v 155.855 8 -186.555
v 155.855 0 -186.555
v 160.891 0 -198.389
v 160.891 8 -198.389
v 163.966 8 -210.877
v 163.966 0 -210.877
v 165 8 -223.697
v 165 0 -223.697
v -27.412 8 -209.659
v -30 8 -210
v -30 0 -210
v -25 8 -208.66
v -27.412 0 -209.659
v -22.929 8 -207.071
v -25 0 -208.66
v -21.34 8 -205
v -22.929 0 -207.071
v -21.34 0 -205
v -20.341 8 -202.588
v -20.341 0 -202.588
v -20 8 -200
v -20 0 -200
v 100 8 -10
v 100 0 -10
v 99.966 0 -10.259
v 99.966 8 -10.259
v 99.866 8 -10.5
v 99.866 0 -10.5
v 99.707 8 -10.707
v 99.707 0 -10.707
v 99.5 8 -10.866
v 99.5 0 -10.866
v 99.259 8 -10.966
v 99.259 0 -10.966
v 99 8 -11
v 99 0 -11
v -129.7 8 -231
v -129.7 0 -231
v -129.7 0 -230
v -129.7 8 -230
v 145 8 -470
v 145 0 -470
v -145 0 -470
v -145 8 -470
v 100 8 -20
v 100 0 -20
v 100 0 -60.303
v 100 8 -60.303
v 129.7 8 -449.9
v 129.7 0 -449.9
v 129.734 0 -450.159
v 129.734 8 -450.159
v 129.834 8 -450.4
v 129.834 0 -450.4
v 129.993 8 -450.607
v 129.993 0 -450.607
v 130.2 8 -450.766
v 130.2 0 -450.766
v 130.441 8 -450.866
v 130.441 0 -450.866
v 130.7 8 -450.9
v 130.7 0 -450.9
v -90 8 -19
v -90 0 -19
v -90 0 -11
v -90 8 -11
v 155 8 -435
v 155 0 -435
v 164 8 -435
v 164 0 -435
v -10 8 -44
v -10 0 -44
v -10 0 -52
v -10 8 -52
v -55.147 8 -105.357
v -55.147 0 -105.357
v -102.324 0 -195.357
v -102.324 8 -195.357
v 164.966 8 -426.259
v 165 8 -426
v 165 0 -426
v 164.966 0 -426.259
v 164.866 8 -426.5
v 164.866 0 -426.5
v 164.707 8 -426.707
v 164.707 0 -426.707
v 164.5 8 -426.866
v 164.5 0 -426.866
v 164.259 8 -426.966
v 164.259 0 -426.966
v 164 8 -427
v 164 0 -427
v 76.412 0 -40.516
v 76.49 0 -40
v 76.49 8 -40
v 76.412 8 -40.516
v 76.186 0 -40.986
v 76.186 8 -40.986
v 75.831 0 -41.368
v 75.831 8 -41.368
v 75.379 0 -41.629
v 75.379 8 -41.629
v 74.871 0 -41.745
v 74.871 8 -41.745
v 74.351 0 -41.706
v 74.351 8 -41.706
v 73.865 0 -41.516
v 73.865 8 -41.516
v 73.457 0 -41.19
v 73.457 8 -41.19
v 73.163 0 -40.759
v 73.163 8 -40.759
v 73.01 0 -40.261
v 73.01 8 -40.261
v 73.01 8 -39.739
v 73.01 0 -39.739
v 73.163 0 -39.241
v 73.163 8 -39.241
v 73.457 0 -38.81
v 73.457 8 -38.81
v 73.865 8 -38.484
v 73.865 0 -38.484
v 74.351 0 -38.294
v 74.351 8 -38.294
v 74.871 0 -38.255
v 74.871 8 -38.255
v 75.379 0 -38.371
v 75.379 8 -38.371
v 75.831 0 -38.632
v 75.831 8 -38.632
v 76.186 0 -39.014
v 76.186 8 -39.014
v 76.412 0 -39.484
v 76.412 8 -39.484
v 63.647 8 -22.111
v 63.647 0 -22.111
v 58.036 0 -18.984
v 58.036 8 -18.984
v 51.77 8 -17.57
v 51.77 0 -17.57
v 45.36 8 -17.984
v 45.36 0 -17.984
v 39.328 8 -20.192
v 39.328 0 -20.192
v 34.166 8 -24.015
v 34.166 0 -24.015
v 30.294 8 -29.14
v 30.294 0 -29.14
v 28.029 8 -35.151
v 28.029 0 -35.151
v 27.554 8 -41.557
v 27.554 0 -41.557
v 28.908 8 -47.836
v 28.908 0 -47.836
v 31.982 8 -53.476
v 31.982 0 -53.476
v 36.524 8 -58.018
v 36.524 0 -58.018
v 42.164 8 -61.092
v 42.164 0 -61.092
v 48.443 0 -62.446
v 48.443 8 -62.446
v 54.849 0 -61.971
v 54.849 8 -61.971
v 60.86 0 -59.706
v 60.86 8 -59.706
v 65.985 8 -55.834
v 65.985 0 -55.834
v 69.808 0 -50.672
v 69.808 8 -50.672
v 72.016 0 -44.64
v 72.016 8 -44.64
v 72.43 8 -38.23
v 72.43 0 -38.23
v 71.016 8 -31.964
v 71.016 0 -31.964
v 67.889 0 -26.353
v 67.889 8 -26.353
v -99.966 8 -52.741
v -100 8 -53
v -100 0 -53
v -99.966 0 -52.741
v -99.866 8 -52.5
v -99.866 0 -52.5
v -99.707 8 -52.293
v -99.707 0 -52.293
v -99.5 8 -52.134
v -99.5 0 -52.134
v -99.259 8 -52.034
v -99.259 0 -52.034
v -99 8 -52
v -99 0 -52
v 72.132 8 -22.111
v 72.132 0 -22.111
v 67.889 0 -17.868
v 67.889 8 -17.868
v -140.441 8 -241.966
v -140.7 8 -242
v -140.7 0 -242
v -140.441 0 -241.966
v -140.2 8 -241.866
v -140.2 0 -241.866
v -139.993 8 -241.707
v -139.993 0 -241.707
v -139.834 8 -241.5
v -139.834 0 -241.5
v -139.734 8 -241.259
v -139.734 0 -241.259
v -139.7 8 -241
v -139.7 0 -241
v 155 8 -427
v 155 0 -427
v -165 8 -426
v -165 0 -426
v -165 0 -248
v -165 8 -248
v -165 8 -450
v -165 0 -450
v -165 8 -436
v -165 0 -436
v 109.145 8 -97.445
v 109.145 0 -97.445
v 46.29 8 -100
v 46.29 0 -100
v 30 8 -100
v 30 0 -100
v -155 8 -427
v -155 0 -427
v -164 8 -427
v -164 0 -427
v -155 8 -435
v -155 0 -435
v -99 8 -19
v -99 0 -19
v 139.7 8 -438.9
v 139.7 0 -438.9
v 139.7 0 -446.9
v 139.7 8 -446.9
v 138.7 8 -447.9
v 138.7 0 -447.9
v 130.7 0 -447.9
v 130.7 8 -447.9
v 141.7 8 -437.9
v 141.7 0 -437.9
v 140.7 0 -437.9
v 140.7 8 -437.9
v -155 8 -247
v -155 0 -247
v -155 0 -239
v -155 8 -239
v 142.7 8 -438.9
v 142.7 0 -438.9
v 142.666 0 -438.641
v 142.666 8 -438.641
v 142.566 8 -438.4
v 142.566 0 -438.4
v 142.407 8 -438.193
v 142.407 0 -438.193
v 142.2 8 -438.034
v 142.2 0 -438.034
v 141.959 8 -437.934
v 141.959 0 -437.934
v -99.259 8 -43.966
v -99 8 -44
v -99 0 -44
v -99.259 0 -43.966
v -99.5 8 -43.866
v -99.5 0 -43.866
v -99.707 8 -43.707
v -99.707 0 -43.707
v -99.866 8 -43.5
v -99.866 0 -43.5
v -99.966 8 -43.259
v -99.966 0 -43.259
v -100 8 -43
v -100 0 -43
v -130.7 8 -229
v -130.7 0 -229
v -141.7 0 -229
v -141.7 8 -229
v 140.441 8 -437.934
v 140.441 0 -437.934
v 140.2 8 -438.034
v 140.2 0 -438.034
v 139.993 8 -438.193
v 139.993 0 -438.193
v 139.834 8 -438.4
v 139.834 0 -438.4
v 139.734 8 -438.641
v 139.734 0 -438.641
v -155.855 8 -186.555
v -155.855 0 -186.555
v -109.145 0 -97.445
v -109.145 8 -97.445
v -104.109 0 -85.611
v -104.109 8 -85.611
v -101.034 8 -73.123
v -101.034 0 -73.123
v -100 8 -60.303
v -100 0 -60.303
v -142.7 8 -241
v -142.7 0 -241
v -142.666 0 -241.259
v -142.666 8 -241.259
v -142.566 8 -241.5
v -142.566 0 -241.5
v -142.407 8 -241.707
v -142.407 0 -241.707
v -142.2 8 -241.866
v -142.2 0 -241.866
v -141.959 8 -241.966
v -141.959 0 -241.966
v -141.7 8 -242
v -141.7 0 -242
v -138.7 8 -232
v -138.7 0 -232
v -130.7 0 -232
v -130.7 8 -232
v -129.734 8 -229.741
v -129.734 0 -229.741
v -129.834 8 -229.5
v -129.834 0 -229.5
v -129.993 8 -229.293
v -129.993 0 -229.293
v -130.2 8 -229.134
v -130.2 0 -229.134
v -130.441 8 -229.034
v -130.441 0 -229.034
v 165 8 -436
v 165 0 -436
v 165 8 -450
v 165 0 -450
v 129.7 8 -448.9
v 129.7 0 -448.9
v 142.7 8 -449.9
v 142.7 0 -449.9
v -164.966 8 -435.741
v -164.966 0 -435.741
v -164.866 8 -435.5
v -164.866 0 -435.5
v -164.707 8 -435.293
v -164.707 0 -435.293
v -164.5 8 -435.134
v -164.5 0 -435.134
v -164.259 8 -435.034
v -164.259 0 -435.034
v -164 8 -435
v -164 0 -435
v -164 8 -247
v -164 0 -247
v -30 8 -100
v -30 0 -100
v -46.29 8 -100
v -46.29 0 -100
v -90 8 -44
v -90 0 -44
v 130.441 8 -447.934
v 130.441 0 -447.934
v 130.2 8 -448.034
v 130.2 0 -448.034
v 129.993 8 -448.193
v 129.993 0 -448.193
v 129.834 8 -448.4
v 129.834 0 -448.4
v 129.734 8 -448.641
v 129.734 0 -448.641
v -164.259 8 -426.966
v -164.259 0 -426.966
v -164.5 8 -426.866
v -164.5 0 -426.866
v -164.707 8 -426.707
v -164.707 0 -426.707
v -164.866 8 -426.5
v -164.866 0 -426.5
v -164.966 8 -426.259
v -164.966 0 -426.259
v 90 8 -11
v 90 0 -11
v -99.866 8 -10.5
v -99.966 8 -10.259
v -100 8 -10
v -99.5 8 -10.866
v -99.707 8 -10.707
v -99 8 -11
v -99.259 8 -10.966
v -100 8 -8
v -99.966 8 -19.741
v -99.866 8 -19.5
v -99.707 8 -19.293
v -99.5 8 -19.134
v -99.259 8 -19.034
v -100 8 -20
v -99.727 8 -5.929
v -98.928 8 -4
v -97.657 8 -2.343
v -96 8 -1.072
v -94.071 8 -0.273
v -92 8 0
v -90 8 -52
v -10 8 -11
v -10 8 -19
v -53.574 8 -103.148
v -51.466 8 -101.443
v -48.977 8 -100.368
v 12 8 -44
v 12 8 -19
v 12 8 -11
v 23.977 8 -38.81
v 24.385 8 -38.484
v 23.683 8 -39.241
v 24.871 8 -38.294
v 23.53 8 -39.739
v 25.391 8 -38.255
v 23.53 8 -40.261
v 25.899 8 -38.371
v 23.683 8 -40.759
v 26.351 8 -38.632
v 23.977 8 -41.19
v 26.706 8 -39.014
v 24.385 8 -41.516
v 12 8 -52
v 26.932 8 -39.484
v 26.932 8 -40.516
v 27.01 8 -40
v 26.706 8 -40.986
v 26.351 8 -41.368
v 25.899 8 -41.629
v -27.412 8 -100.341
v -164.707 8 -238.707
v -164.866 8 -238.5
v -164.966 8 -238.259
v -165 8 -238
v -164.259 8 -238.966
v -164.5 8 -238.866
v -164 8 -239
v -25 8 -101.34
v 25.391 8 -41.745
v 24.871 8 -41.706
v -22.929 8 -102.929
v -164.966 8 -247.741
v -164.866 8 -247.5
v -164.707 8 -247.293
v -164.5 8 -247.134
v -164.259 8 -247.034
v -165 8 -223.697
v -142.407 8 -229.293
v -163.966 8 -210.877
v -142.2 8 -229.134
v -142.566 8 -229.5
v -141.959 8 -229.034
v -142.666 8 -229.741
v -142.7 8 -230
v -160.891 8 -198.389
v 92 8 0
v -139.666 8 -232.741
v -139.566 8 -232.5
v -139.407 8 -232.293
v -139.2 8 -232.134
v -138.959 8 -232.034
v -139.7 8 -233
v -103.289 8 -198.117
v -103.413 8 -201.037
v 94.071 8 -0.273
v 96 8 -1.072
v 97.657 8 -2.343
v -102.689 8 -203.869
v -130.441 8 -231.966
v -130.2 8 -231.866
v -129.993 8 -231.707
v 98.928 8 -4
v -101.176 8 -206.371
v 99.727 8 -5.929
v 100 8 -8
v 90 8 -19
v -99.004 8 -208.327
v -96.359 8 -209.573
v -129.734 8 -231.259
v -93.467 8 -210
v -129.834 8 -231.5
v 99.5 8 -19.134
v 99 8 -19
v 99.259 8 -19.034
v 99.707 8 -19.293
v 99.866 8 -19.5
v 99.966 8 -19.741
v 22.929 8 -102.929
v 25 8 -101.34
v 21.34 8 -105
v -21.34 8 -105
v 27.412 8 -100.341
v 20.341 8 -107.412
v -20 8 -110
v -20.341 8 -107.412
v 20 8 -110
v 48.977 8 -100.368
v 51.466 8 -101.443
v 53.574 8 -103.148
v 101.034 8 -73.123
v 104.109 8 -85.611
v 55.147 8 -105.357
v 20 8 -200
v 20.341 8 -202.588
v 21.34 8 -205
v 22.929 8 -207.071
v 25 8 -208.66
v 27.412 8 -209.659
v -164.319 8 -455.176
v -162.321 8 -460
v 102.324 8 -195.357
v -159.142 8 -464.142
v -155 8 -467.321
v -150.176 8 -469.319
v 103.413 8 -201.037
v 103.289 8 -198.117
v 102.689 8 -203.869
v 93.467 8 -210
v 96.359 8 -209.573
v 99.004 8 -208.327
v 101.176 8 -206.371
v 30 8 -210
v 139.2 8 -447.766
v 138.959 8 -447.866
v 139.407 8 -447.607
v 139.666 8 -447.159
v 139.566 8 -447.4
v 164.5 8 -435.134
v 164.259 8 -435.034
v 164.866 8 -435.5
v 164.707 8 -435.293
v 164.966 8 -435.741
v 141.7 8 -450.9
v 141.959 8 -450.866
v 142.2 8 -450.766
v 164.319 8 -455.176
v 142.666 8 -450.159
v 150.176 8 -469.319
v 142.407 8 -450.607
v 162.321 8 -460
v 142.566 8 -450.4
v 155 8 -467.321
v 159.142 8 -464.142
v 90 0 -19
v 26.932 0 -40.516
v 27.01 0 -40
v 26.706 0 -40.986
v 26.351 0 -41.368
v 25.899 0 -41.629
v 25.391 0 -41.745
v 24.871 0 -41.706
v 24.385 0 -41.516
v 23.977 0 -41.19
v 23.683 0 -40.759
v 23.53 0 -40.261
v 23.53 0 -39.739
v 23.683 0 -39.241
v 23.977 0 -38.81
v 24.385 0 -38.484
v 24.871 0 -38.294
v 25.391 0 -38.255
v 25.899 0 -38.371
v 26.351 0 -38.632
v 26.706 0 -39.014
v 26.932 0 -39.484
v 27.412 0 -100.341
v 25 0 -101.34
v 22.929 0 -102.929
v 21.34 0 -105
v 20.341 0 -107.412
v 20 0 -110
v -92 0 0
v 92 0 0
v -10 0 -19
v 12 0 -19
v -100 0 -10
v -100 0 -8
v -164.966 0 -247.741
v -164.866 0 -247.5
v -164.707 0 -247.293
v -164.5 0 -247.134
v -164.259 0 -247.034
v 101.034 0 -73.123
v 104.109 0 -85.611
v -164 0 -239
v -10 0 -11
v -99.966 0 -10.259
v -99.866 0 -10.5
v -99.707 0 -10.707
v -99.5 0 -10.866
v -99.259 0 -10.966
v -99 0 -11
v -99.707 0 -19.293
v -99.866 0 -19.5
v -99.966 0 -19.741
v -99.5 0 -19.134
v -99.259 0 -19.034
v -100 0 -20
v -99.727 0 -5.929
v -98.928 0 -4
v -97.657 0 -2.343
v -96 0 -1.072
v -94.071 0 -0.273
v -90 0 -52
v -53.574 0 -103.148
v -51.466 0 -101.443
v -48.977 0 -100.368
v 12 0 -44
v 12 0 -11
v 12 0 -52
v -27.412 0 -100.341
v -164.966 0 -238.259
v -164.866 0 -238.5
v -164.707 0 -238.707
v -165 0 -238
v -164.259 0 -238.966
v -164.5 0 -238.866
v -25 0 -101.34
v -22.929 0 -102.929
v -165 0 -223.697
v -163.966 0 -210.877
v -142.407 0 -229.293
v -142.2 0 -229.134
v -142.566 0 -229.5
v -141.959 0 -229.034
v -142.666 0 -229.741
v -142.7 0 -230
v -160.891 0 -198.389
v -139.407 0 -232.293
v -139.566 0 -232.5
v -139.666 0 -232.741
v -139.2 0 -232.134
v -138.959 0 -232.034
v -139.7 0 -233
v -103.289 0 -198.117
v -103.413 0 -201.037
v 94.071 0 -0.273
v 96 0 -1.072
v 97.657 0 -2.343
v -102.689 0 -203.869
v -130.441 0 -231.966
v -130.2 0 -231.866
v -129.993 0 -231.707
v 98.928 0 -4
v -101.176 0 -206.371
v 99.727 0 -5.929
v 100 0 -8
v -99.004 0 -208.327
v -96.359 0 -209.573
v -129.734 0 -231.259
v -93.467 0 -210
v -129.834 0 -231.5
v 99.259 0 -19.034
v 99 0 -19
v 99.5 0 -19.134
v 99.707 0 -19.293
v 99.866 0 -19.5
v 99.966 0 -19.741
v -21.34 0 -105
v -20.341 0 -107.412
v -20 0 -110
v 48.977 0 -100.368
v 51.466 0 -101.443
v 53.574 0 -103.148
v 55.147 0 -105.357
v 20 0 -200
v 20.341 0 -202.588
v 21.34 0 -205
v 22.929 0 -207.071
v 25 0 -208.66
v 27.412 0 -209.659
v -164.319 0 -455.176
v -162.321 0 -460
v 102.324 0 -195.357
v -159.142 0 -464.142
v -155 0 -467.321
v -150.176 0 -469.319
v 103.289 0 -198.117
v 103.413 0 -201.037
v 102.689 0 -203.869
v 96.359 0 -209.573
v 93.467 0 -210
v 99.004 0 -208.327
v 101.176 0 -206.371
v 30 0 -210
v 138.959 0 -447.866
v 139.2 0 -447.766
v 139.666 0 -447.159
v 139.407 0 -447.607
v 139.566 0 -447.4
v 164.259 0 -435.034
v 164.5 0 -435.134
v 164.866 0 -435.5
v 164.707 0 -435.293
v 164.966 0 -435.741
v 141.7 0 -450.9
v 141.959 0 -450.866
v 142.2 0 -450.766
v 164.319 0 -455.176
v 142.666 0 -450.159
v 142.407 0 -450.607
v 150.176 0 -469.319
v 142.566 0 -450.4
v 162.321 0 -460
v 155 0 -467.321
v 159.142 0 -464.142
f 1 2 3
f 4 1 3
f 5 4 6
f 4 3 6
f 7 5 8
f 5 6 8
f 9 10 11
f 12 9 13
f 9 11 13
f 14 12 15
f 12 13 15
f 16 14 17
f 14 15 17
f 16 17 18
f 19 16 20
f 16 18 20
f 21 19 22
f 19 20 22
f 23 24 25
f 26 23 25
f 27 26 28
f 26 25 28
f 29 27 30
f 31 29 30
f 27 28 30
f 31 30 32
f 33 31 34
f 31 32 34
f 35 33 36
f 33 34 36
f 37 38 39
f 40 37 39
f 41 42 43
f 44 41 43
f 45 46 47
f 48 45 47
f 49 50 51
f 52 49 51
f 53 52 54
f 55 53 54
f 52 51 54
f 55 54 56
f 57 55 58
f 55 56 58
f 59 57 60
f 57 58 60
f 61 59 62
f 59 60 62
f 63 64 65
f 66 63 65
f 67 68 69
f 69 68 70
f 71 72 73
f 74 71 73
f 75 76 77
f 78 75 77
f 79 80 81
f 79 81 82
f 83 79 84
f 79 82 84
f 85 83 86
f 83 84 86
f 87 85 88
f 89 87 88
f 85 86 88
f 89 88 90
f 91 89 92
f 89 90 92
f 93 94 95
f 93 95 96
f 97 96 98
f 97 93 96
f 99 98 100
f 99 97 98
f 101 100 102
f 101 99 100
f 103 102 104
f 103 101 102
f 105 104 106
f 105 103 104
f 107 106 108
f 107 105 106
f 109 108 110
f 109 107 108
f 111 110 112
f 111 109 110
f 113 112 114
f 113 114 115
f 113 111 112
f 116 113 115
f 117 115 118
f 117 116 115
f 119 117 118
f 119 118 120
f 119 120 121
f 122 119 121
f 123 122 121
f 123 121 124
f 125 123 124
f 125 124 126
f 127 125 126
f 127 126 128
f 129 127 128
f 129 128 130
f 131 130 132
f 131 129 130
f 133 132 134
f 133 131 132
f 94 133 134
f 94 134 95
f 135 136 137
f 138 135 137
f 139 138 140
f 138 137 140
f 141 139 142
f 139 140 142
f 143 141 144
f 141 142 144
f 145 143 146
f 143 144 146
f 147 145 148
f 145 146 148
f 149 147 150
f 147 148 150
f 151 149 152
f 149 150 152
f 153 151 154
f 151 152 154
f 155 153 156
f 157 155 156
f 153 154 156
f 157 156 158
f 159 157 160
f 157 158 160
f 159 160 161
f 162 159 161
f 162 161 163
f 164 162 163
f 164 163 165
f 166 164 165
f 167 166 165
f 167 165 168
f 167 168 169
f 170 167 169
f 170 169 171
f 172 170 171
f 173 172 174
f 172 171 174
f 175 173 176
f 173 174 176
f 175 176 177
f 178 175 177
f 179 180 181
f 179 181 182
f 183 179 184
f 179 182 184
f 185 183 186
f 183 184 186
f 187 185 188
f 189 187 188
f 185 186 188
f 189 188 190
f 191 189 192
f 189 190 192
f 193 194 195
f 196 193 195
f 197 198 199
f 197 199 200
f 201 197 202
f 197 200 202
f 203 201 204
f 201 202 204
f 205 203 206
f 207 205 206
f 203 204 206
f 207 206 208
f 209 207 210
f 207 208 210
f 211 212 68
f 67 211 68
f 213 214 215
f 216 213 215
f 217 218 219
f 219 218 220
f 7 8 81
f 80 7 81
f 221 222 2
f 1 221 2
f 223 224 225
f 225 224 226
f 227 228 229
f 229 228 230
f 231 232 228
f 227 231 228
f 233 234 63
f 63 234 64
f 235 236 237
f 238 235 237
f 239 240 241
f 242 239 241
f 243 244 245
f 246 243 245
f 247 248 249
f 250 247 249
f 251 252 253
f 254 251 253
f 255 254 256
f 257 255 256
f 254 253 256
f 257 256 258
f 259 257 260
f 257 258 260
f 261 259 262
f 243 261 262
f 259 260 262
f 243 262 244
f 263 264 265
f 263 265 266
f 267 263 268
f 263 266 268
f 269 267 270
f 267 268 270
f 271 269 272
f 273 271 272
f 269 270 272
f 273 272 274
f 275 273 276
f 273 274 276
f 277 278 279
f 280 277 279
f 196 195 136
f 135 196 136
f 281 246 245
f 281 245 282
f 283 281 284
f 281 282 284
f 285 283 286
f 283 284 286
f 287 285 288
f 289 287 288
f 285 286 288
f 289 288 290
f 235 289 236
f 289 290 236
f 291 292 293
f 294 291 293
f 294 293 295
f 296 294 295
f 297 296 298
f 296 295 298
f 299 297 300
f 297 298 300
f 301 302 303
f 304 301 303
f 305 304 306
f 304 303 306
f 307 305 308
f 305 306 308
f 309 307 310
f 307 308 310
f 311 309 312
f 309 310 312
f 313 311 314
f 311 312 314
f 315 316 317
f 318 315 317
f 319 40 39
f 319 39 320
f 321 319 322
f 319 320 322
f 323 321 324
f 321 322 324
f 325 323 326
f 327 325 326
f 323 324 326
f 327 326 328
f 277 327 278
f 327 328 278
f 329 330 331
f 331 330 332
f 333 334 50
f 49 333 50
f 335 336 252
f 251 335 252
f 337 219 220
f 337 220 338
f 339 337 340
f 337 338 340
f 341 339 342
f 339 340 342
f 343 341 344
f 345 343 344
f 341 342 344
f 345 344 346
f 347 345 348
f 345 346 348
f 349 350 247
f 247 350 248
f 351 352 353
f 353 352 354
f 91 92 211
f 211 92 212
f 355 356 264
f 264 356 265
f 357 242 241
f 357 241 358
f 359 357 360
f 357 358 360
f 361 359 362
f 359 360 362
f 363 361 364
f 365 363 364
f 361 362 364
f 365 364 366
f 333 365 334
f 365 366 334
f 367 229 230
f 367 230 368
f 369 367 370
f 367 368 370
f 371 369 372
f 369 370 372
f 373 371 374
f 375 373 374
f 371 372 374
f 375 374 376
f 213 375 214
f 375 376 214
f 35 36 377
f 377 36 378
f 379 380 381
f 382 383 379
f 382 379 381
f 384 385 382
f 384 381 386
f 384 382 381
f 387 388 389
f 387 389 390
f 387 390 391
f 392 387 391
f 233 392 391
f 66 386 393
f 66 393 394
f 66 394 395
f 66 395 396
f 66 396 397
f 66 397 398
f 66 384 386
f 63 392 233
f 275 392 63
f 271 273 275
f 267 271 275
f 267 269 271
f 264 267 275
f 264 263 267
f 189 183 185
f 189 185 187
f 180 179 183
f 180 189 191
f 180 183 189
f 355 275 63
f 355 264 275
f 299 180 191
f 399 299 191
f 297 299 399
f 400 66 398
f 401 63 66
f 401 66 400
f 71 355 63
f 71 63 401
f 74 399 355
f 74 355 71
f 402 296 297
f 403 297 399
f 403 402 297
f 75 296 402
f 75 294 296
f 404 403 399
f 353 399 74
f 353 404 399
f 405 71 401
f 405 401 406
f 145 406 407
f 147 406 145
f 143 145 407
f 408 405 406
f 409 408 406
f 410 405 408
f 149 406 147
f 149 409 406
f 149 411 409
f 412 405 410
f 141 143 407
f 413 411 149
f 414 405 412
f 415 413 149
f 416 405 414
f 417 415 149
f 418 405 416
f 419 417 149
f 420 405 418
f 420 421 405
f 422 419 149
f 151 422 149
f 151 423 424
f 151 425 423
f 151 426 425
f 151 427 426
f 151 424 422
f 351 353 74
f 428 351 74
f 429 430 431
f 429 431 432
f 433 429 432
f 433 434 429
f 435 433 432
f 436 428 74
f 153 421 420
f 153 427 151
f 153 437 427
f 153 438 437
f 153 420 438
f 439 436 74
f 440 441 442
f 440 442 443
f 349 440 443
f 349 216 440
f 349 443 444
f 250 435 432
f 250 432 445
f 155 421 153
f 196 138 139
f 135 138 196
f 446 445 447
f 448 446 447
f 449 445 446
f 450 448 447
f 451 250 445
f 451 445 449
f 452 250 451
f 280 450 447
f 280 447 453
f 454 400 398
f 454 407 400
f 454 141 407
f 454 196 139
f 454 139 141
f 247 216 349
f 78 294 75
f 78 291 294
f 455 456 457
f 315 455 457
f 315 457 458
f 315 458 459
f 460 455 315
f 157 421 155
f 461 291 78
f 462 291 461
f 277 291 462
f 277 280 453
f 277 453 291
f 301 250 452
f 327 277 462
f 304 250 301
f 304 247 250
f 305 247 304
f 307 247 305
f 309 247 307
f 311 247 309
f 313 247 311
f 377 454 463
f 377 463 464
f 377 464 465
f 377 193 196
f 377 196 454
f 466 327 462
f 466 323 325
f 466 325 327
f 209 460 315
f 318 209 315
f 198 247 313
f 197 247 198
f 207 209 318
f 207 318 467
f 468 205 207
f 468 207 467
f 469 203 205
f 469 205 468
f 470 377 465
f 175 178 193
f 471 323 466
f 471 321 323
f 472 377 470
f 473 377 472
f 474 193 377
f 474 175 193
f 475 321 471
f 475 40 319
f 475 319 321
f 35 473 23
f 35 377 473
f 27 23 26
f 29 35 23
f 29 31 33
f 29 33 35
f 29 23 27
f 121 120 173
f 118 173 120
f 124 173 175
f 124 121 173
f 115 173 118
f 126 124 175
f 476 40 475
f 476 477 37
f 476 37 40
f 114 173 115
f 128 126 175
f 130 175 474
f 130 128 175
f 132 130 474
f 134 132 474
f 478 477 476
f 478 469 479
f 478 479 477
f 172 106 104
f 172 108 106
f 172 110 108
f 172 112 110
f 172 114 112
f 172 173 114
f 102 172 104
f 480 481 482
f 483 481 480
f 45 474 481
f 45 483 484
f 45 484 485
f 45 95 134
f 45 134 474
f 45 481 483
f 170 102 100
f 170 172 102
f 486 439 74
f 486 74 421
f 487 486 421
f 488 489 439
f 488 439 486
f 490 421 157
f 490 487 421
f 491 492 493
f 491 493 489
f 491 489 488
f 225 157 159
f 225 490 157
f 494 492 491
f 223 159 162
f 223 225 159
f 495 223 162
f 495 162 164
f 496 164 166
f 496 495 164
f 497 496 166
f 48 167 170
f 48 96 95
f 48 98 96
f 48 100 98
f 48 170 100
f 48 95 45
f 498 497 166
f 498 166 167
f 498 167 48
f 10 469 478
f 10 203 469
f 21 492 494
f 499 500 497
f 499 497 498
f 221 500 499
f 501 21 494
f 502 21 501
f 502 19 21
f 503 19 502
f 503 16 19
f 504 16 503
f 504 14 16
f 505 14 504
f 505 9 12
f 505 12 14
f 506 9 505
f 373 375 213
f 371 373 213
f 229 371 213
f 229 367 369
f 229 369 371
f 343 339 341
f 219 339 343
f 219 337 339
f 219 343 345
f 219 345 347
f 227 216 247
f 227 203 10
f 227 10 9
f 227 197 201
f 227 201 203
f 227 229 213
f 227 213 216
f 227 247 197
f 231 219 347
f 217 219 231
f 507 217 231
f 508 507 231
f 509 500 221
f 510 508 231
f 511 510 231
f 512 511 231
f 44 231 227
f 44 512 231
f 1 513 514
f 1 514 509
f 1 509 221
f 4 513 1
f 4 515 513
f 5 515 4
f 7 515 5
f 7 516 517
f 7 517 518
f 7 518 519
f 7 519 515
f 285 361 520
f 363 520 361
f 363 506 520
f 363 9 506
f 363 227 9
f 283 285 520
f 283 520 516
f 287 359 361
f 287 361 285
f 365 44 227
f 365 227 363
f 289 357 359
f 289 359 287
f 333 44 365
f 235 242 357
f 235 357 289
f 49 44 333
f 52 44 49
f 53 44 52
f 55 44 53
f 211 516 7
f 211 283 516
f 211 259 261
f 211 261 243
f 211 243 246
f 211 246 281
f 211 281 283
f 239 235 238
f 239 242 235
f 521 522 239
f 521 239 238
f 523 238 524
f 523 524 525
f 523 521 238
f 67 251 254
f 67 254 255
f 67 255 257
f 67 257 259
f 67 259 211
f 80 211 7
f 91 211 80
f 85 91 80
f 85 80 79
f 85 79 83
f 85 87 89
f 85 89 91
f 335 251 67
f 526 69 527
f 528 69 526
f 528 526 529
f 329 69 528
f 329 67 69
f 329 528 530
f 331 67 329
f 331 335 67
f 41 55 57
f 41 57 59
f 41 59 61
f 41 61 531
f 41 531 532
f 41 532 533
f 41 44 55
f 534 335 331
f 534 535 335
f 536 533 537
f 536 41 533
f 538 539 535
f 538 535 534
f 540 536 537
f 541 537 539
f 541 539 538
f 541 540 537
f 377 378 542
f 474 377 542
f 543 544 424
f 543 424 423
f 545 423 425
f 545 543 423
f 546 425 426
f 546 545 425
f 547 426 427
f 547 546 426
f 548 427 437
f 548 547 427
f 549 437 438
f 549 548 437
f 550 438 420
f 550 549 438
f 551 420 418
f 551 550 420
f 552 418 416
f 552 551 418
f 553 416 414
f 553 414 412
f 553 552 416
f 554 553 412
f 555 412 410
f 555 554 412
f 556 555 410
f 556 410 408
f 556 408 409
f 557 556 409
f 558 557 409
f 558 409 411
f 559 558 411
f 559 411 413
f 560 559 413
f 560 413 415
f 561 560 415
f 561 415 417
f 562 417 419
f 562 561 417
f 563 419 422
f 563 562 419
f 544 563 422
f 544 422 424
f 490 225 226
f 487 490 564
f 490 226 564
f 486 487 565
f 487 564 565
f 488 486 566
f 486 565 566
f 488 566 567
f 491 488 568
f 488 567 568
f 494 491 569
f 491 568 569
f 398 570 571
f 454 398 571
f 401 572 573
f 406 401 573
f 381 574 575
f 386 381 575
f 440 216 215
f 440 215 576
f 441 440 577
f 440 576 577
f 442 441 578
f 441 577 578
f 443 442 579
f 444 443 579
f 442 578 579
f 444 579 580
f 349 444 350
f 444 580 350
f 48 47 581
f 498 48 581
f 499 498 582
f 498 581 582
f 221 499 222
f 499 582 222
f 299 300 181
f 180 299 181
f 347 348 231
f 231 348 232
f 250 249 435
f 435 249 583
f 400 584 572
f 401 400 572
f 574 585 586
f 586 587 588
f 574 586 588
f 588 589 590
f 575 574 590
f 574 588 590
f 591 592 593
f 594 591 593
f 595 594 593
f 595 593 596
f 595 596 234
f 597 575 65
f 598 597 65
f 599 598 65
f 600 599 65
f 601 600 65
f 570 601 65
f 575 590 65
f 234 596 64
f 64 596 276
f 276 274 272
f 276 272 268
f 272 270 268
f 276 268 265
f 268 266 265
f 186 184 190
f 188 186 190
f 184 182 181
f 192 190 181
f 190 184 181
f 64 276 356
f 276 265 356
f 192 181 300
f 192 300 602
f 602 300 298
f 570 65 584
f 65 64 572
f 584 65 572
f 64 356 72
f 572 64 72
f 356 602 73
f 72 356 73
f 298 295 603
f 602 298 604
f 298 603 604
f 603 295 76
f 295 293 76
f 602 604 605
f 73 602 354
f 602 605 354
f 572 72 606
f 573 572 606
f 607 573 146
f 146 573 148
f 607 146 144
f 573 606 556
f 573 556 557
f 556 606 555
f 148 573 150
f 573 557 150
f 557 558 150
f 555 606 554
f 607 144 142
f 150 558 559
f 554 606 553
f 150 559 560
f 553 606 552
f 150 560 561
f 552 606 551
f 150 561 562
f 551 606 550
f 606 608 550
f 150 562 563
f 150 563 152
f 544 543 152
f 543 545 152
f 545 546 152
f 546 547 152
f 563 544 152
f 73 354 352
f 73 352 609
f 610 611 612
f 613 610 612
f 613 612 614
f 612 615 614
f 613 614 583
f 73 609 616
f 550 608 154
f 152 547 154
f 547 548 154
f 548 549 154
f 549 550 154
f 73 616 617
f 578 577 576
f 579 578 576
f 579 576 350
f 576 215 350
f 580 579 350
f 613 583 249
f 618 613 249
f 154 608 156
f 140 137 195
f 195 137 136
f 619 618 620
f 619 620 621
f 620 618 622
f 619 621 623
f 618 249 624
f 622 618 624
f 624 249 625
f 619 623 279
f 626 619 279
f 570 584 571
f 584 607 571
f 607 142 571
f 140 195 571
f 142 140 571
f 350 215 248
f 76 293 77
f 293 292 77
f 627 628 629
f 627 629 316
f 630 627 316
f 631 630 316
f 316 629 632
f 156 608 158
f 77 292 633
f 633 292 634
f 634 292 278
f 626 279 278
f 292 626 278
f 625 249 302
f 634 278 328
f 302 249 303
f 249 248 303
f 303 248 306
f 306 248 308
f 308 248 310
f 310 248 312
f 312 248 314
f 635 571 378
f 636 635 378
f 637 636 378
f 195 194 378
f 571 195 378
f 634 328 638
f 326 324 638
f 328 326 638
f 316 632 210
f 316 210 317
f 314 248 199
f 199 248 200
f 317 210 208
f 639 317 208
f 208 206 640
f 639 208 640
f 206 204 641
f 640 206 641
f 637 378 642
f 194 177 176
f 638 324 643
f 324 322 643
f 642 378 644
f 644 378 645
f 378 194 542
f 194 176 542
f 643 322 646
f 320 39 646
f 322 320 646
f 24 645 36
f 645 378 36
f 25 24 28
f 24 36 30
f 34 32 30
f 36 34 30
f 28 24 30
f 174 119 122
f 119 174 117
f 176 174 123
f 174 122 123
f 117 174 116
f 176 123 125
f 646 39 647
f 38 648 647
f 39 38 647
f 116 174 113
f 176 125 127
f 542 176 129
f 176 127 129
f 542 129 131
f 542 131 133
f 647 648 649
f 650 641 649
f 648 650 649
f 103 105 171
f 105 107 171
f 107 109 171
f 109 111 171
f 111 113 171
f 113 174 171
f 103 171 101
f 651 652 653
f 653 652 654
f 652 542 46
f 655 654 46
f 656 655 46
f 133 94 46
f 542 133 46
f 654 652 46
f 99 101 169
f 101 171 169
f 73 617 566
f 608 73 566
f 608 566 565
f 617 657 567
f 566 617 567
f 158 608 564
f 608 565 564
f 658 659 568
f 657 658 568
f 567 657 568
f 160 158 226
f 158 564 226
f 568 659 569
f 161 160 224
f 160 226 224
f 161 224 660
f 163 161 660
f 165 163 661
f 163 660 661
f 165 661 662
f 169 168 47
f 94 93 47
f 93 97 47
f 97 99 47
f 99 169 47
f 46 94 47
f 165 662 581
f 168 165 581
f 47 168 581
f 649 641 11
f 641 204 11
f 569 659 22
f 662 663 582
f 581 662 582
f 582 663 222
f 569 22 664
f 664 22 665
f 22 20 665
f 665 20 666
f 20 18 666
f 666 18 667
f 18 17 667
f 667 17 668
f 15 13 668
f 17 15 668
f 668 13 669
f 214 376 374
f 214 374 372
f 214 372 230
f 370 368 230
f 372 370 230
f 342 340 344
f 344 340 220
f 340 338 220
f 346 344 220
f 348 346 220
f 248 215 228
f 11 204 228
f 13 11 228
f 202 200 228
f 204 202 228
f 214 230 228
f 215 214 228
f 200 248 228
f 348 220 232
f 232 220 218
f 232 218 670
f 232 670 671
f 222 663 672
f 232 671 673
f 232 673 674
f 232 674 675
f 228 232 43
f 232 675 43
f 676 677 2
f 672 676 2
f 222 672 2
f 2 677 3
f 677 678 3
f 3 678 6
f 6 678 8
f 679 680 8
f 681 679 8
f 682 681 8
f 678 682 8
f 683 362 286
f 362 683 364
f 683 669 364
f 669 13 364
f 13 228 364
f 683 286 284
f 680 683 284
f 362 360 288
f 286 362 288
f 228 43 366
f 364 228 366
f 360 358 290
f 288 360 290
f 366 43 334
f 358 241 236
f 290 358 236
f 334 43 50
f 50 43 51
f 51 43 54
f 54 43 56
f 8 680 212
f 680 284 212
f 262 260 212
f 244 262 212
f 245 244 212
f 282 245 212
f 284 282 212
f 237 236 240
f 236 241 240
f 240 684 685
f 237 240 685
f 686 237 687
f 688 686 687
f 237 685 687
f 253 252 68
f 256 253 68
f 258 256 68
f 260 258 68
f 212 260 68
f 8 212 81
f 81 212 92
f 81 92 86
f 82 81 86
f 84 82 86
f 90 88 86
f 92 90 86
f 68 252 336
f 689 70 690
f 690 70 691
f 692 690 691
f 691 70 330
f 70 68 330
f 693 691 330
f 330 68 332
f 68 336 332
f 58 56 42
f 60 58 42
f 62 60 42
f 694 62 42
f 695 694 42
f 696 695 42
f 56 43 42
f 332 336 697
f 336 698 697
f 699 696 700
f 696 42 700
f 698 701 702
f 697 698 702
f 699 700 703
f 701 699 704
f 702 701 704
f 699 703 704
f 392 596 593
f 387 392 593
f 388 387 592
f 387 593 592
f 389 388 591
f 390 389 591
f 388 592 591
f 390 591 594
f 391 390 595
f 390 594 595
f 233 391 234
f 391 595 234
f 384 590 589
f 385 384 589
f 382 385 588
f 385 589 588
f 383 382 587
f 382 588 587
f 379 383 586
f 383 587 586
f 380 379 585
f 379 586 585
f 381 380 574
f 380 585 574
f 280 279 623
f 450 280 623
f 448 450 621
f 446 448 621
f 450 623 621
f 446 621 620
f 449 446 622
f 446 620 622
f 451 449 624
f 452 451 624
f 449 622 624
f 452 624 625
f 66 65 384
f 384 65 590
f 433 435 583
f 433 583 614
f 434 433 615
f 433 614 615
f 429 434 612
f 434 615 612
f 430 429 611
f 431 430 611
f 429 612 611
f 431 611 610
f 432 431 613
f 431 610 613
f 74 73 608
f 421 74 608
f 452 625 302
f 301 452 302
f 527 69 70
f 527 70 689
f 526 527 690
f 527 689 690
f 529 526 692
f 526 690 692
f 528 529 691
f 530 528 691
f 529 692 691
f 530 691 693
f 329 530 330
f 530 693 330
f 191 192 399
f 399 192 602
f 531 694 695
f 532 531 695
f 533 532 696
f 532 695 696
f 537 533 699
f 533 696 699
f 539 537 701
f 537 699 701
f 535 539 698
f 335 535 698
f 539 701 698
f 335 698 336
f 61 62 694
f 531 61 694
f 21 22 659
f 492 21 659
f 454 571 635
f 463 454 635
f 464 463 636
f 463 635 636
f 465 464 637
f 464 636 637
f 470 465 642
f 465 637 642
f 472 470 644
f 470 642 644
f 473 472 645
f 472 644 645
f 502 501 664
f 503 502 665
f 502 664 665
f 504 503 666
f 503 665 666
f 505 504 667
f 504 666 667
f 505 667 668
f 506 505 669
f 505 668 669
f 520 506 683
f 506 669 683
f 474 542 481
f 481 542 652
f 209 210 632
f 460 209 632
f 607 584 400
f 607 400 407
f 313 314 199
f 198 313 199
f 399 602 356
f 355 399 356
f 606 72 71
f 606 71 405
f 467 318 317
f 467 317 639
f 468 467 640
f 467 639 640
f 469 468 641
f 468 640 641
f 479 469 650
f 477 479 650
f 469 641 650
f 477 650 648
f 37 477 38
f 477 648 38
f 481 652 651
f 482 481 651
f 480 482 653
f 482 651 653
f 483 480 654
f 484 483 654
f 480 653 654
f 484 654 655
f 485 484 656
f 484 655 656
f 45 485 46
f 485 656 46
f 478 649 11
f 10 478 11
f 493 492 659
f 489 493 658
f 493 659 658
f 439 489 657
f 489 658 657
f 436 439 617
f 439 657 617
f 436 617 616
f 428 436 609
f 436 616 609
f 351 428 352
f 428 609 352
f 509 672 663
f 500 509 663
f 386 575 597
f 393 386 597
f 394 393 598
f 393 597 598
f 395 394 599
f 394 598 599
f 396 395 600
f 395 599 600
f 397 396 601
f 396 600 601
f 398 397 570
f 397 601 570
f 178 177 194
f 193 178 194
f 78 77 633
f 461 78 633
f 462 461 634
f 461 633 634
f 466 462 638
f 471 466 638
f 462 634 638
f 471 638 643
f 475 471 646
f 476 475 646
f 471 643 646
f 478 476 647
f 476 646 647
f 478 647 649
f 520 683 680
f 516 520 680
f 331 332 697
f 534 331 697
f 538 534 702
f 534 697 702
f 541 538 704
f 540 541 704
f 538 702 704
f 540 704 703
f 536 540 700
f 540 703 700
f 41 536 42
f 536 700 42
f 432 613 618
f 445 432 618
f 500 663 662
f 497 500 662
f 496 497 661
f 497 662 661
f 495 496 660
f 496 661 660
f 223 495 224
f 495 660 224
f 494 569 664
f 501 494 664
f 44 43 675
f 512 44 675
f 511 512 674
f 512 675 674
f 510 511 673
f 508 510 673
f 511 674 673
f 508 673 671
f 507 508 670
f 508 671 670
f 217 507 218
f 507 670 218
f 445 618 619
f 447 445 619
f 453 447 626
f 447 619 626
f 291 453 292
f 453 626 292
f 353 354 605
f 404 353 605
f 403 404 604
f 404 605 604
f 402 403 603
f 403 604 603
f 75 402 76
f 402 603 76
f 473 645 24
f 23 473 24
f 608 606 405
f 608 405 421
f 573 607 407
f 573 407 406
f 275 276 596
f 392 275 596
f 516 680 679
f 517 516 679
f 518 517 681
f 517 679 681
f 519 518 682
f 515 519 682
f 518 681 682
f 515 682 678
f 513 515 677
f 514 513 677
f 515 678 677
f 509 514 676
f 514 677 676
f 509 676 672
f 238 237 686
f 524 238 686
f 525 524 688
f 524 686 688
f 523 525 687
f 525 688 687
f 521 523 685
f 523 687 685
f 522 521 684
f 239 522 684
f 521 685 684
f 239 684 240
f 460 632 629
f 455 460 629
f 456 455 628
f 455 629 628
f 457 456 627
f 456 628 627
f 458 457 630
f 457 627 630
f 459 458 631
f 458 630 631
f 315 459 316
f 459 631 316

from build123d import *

# Parameters (mm, degrees)
SKETCH1_W           = 22
SKETCH1_H           = 8
SKETCH1_R           = 1.75
BOSS_EXTRUDE1_DEPTH = 8


with BuildPart() as part:
    # Sketch1 → Boss-Extrude1 (new body)
    with BuildSketch(Plane(origin=(0, 0, 0), x_dir=(1, 0, 0), z_dir=(0, 1, 0))):
        with BuildLine():
            Line((-92, 0), (92, 0))
            ThreePointArc((92, 0), (97.656854249, 2.343145751), (100, 8))
            Line((100, 8), (100, 10))
            ThreePointArc((100, 10), (99.707106781, 10.707106781), (99, 11))
            Line((99, 11), (90, 11))
            Line((90, 11), (90, 19))
            Line((90, 19), (99, 19))
            ThreePointArc((99, 19), (99.707106781, 19.292893219), (100, 20))
            Line((100, 20), (100, 60.303296759))
            ThreePointArc((100, 60.303296759), (102.319800375, 79.428844756), (109.144664654, 97.445206417))
            Line((109.144664654, 97.445206417), (155.855335346, 186.554793583))
            ThreePointArc((155.855335346, 186.554793583), (162.680199625, 204.571155244), (165, 223.696703241))
            Line((165, 223.696703241), (165, 426))
            ThreePointArc((165, 426), (164.707106781, 426.707106781), (164, 427))
            Line((164, 427), (155, 427))
            Line((155, 427), (155, 435))
            Line((155, 435), (164, 435))
            ThreePointArc((164, 435), (164.707106781, 435.292893219), (165, 436))
            Line((165, 436), (165, 450))
            ThreePointArc((165, 450), (159.142135624, 464.142135624), (145, 470))
            Line((145, 470), (-145, 470))
            ThreePointArc((-145, 470), (-159.142135624, 464.142135624), (-165, 450))
            Line((-165, 450), (-165, 436))
            ThreePointArc((-165, 436), (-164.707106781, 435.292893219), (-164, 435))
            Line((-164, 435), (-155, 435))
            Line((-155, 435), (-155, 427))
            Line((-155, 427), (-164, 427))
            ThreePointArc((-164, 427), (-164.707106781, 426.707106781), (-165, 426))
            Line((-165, 426), (-165, 248))
            ThreePointArc((-165, 248), (-164.707106781, 247.292893219), (-164, 247))
            Line((-164, 247), (-155, 247))
            Line((-155, 247), (-155, 239))
            Line((-155, 239), (-164, 239))
            ThreePointArc((-164, 239), (-164.707106781, 238.707106781), (-165, 238))
            Line((-165, 238), (-165, 223.696703241))
            ThreePointArc((-165, 223.696703241), (-162.680199625, 204.571155244), (-155.855335346, 186.554793583))
            Line((-155.855335346, 186.554793583), (-109.144664654, 97.445206417))
            ThreePointArc((-109.144664654, 97.445206417), (-102.319800375, 79.428844756), (-100, 60.303296759))
            Line((-100, 60.303296759), (-100, 53))
            ThreePointArc((-100, 53), (-99.707106781, 52.292893219), (-99, 52))
            Line((-99, 52), (-90, 52))
            Line((-90, 52), (-90, 44))
            Line((-90, 44), (-99, 44))
            ThreePointArc((-99, 44), (-99.707106781, 43.707106781), (-100, 43))
            Line((-100, 43), (-100, 20))
            ThreePointArc((-100, 20), (-99.707106781, 19.292893219), (-99, 19))
            Line((-99, 19), (-90, 19))
            Line((-90, 19), (-90, 11))
            Line((-90, 11), (-99, 11))
            ThreePointArc((-99, 11), (-99.707106781, 10.707106781), (-100, 10))
            Line((-100, 10), (-100, 8))
            ThreePointArc((-100, 8), (-97.656854249, 2.343145751), (-92, 0))
        make_face()
        with BuildLine():
            Line((-55.146951484, 105.357261293), (-102.324370839, 195.357261293))
            ThreePointArc((-102.324370839, 195.357261293), (-102.023953996, 205.175548905), (-93.467453921, 210))
            Line((-93.467453921, 210), (-30, 210))
            ThreePointArc((-30, 210), (-22.928932188, 207.071067812), (-20, 200))
            Line((-20, 200), (-20, 110))
            ThreePointArc((-20, 110), (-22.928932188, 102.928932188), (-30, 100))
            Line((-30, 100), (-46.290034566, 100))
            ThreePointArc((-46.290034566, 100), (-51.465583471, 101.443499925), (-55.146951484, 105.357261293))
        make_face(mode=Mode.SUBTRACT)
        with Locations((1, 15)):
            Rectangle(SKETCH1_W, SKETCH1_H, mode=Mode.SUBTRACT)
        with Locations((1, 48)):
            Rectangle(SKETCH1_W, SKETCH1_H, mode=Mode.SUBTRACT)
        with Locations((25.26, 40)):
            Circle(SKETCH1_R, mode=Mode.SUBTRACT)
        with BuildLine():
            ThreePointArc((63.646526688, 22.110832625), (34.090097423, 55.909902577), (67.889167375, 26.353473312))
            Line((67.889167375, 26.353473312), (72.131808062, 22.110832625))
            Line((72.131808062, 22.110832625), (67.889167375, 17.868191938))
            Line((67.889167375, 17.868191938), (63.646526688, 22.110832625))
        make_face(mode=Mode.SUBTRACT)
        with Locations((74.74, 40)):
            Circle(SKETCH1_R, mode=Mode.SUBTRACT)
        with BuildLine():
            ThreePointArc((20, 200), (22.928932188, 207.071067812), (30, 210))
            Line((30, 210), (93.467453921, 210))
            ThreePointArc((93.467453921, 210), (102.023953996, 205.175548905), (102.324370839, 195.357261293))
            Line((102.324370839, 195.357261293), (55.146951484, 105.357261293))
            ThreePointArc((55.146951484, 105.357261293), (51.465583471, 101.443499925), (46.290034566, 100))
            Line((46.290034566, 100), (30, 100))
            ThreePointArc((30, 100), (22.928932188, 102.928932188), (20, 110))
            Line((20, 110), (20, 200))
        make_face(mode=Mode.SUBTRACT)
        with BuildLine():
            ThreePointArc((-140.7, 242), (-139.992893219, 241.707106781), (-139.7, 241))
            Line((-139.7, 241), (-139.7, 233))
            ThreePointArc((-139.7, 233), (-139.407106781, 232.292893219), (-138.7, 232))
            Line((-138.7, 232), (-130.7, 232))
            ThreePointArc((-130.7, 232), (-129.992893219, 231.707106781), (-129.7, 231))
            Line((-129.7, 231), (-129.7, 230))
            ThreePointArc((-129.7, 230), (-129.992893219, 229.292893219), (-130.7, 229))
            Line((-130.7, 229), (-141.7, 229))
            ThreePointArc((-141.7, 229), (-142.407106781, 229.292893219), (-142.7, 230))
            Line((-142.7, 230), (-142.7, 241))
            ThreePointArc((-142.7, 241), (-142.407106781, 241.707106781), (-141.7, 242))
            Line((-141.7, 242), (-140.7, 242))
        make_face(mode=Mode.SUBTRACT)
        with BuildLine():
            Line((129.7, 448.9), (129.7, 449.9))
            ThreePointArc((129.7, 449.9), (129.992893219, 450.607106781), (130.7, 450.9))
            Line((130.7, 450.9), (141.7, 450.9))
            ThreePointArc((141.7, 450.9), (142.407106781, 450.607106781), (142.7, 449.9))
            Line((142.7, 449.9), (142.7, 438.9))
            ThreePointArc((142.7, 438.9), (142.407106781, 438.192893219), (141.7, 437.9))
            Line((141.7, 437.9), (140.7, 437.9))
            ThreePointArc((140.7, 437.9), (139.992893219, 438.192893219), (139.7, 438.9))
            Line((139.7, 438.9), (139.7, 446.9))
            ThreePointArc((139.7, 446.9), (139.407106781, 447.607106781), (138.7, 447.9))
            Line((138.7, 447.9), (130.7, 447.9))
            ThreePointArc((130.7, 447.9), (129.992893219, 448.192893219), (129.7, 448.9))
        make_face(mode=Mode.SUBTRACT)
    extrude(amount=BOSS_EXTRUDE1_DEPTH)


solid = part.part
